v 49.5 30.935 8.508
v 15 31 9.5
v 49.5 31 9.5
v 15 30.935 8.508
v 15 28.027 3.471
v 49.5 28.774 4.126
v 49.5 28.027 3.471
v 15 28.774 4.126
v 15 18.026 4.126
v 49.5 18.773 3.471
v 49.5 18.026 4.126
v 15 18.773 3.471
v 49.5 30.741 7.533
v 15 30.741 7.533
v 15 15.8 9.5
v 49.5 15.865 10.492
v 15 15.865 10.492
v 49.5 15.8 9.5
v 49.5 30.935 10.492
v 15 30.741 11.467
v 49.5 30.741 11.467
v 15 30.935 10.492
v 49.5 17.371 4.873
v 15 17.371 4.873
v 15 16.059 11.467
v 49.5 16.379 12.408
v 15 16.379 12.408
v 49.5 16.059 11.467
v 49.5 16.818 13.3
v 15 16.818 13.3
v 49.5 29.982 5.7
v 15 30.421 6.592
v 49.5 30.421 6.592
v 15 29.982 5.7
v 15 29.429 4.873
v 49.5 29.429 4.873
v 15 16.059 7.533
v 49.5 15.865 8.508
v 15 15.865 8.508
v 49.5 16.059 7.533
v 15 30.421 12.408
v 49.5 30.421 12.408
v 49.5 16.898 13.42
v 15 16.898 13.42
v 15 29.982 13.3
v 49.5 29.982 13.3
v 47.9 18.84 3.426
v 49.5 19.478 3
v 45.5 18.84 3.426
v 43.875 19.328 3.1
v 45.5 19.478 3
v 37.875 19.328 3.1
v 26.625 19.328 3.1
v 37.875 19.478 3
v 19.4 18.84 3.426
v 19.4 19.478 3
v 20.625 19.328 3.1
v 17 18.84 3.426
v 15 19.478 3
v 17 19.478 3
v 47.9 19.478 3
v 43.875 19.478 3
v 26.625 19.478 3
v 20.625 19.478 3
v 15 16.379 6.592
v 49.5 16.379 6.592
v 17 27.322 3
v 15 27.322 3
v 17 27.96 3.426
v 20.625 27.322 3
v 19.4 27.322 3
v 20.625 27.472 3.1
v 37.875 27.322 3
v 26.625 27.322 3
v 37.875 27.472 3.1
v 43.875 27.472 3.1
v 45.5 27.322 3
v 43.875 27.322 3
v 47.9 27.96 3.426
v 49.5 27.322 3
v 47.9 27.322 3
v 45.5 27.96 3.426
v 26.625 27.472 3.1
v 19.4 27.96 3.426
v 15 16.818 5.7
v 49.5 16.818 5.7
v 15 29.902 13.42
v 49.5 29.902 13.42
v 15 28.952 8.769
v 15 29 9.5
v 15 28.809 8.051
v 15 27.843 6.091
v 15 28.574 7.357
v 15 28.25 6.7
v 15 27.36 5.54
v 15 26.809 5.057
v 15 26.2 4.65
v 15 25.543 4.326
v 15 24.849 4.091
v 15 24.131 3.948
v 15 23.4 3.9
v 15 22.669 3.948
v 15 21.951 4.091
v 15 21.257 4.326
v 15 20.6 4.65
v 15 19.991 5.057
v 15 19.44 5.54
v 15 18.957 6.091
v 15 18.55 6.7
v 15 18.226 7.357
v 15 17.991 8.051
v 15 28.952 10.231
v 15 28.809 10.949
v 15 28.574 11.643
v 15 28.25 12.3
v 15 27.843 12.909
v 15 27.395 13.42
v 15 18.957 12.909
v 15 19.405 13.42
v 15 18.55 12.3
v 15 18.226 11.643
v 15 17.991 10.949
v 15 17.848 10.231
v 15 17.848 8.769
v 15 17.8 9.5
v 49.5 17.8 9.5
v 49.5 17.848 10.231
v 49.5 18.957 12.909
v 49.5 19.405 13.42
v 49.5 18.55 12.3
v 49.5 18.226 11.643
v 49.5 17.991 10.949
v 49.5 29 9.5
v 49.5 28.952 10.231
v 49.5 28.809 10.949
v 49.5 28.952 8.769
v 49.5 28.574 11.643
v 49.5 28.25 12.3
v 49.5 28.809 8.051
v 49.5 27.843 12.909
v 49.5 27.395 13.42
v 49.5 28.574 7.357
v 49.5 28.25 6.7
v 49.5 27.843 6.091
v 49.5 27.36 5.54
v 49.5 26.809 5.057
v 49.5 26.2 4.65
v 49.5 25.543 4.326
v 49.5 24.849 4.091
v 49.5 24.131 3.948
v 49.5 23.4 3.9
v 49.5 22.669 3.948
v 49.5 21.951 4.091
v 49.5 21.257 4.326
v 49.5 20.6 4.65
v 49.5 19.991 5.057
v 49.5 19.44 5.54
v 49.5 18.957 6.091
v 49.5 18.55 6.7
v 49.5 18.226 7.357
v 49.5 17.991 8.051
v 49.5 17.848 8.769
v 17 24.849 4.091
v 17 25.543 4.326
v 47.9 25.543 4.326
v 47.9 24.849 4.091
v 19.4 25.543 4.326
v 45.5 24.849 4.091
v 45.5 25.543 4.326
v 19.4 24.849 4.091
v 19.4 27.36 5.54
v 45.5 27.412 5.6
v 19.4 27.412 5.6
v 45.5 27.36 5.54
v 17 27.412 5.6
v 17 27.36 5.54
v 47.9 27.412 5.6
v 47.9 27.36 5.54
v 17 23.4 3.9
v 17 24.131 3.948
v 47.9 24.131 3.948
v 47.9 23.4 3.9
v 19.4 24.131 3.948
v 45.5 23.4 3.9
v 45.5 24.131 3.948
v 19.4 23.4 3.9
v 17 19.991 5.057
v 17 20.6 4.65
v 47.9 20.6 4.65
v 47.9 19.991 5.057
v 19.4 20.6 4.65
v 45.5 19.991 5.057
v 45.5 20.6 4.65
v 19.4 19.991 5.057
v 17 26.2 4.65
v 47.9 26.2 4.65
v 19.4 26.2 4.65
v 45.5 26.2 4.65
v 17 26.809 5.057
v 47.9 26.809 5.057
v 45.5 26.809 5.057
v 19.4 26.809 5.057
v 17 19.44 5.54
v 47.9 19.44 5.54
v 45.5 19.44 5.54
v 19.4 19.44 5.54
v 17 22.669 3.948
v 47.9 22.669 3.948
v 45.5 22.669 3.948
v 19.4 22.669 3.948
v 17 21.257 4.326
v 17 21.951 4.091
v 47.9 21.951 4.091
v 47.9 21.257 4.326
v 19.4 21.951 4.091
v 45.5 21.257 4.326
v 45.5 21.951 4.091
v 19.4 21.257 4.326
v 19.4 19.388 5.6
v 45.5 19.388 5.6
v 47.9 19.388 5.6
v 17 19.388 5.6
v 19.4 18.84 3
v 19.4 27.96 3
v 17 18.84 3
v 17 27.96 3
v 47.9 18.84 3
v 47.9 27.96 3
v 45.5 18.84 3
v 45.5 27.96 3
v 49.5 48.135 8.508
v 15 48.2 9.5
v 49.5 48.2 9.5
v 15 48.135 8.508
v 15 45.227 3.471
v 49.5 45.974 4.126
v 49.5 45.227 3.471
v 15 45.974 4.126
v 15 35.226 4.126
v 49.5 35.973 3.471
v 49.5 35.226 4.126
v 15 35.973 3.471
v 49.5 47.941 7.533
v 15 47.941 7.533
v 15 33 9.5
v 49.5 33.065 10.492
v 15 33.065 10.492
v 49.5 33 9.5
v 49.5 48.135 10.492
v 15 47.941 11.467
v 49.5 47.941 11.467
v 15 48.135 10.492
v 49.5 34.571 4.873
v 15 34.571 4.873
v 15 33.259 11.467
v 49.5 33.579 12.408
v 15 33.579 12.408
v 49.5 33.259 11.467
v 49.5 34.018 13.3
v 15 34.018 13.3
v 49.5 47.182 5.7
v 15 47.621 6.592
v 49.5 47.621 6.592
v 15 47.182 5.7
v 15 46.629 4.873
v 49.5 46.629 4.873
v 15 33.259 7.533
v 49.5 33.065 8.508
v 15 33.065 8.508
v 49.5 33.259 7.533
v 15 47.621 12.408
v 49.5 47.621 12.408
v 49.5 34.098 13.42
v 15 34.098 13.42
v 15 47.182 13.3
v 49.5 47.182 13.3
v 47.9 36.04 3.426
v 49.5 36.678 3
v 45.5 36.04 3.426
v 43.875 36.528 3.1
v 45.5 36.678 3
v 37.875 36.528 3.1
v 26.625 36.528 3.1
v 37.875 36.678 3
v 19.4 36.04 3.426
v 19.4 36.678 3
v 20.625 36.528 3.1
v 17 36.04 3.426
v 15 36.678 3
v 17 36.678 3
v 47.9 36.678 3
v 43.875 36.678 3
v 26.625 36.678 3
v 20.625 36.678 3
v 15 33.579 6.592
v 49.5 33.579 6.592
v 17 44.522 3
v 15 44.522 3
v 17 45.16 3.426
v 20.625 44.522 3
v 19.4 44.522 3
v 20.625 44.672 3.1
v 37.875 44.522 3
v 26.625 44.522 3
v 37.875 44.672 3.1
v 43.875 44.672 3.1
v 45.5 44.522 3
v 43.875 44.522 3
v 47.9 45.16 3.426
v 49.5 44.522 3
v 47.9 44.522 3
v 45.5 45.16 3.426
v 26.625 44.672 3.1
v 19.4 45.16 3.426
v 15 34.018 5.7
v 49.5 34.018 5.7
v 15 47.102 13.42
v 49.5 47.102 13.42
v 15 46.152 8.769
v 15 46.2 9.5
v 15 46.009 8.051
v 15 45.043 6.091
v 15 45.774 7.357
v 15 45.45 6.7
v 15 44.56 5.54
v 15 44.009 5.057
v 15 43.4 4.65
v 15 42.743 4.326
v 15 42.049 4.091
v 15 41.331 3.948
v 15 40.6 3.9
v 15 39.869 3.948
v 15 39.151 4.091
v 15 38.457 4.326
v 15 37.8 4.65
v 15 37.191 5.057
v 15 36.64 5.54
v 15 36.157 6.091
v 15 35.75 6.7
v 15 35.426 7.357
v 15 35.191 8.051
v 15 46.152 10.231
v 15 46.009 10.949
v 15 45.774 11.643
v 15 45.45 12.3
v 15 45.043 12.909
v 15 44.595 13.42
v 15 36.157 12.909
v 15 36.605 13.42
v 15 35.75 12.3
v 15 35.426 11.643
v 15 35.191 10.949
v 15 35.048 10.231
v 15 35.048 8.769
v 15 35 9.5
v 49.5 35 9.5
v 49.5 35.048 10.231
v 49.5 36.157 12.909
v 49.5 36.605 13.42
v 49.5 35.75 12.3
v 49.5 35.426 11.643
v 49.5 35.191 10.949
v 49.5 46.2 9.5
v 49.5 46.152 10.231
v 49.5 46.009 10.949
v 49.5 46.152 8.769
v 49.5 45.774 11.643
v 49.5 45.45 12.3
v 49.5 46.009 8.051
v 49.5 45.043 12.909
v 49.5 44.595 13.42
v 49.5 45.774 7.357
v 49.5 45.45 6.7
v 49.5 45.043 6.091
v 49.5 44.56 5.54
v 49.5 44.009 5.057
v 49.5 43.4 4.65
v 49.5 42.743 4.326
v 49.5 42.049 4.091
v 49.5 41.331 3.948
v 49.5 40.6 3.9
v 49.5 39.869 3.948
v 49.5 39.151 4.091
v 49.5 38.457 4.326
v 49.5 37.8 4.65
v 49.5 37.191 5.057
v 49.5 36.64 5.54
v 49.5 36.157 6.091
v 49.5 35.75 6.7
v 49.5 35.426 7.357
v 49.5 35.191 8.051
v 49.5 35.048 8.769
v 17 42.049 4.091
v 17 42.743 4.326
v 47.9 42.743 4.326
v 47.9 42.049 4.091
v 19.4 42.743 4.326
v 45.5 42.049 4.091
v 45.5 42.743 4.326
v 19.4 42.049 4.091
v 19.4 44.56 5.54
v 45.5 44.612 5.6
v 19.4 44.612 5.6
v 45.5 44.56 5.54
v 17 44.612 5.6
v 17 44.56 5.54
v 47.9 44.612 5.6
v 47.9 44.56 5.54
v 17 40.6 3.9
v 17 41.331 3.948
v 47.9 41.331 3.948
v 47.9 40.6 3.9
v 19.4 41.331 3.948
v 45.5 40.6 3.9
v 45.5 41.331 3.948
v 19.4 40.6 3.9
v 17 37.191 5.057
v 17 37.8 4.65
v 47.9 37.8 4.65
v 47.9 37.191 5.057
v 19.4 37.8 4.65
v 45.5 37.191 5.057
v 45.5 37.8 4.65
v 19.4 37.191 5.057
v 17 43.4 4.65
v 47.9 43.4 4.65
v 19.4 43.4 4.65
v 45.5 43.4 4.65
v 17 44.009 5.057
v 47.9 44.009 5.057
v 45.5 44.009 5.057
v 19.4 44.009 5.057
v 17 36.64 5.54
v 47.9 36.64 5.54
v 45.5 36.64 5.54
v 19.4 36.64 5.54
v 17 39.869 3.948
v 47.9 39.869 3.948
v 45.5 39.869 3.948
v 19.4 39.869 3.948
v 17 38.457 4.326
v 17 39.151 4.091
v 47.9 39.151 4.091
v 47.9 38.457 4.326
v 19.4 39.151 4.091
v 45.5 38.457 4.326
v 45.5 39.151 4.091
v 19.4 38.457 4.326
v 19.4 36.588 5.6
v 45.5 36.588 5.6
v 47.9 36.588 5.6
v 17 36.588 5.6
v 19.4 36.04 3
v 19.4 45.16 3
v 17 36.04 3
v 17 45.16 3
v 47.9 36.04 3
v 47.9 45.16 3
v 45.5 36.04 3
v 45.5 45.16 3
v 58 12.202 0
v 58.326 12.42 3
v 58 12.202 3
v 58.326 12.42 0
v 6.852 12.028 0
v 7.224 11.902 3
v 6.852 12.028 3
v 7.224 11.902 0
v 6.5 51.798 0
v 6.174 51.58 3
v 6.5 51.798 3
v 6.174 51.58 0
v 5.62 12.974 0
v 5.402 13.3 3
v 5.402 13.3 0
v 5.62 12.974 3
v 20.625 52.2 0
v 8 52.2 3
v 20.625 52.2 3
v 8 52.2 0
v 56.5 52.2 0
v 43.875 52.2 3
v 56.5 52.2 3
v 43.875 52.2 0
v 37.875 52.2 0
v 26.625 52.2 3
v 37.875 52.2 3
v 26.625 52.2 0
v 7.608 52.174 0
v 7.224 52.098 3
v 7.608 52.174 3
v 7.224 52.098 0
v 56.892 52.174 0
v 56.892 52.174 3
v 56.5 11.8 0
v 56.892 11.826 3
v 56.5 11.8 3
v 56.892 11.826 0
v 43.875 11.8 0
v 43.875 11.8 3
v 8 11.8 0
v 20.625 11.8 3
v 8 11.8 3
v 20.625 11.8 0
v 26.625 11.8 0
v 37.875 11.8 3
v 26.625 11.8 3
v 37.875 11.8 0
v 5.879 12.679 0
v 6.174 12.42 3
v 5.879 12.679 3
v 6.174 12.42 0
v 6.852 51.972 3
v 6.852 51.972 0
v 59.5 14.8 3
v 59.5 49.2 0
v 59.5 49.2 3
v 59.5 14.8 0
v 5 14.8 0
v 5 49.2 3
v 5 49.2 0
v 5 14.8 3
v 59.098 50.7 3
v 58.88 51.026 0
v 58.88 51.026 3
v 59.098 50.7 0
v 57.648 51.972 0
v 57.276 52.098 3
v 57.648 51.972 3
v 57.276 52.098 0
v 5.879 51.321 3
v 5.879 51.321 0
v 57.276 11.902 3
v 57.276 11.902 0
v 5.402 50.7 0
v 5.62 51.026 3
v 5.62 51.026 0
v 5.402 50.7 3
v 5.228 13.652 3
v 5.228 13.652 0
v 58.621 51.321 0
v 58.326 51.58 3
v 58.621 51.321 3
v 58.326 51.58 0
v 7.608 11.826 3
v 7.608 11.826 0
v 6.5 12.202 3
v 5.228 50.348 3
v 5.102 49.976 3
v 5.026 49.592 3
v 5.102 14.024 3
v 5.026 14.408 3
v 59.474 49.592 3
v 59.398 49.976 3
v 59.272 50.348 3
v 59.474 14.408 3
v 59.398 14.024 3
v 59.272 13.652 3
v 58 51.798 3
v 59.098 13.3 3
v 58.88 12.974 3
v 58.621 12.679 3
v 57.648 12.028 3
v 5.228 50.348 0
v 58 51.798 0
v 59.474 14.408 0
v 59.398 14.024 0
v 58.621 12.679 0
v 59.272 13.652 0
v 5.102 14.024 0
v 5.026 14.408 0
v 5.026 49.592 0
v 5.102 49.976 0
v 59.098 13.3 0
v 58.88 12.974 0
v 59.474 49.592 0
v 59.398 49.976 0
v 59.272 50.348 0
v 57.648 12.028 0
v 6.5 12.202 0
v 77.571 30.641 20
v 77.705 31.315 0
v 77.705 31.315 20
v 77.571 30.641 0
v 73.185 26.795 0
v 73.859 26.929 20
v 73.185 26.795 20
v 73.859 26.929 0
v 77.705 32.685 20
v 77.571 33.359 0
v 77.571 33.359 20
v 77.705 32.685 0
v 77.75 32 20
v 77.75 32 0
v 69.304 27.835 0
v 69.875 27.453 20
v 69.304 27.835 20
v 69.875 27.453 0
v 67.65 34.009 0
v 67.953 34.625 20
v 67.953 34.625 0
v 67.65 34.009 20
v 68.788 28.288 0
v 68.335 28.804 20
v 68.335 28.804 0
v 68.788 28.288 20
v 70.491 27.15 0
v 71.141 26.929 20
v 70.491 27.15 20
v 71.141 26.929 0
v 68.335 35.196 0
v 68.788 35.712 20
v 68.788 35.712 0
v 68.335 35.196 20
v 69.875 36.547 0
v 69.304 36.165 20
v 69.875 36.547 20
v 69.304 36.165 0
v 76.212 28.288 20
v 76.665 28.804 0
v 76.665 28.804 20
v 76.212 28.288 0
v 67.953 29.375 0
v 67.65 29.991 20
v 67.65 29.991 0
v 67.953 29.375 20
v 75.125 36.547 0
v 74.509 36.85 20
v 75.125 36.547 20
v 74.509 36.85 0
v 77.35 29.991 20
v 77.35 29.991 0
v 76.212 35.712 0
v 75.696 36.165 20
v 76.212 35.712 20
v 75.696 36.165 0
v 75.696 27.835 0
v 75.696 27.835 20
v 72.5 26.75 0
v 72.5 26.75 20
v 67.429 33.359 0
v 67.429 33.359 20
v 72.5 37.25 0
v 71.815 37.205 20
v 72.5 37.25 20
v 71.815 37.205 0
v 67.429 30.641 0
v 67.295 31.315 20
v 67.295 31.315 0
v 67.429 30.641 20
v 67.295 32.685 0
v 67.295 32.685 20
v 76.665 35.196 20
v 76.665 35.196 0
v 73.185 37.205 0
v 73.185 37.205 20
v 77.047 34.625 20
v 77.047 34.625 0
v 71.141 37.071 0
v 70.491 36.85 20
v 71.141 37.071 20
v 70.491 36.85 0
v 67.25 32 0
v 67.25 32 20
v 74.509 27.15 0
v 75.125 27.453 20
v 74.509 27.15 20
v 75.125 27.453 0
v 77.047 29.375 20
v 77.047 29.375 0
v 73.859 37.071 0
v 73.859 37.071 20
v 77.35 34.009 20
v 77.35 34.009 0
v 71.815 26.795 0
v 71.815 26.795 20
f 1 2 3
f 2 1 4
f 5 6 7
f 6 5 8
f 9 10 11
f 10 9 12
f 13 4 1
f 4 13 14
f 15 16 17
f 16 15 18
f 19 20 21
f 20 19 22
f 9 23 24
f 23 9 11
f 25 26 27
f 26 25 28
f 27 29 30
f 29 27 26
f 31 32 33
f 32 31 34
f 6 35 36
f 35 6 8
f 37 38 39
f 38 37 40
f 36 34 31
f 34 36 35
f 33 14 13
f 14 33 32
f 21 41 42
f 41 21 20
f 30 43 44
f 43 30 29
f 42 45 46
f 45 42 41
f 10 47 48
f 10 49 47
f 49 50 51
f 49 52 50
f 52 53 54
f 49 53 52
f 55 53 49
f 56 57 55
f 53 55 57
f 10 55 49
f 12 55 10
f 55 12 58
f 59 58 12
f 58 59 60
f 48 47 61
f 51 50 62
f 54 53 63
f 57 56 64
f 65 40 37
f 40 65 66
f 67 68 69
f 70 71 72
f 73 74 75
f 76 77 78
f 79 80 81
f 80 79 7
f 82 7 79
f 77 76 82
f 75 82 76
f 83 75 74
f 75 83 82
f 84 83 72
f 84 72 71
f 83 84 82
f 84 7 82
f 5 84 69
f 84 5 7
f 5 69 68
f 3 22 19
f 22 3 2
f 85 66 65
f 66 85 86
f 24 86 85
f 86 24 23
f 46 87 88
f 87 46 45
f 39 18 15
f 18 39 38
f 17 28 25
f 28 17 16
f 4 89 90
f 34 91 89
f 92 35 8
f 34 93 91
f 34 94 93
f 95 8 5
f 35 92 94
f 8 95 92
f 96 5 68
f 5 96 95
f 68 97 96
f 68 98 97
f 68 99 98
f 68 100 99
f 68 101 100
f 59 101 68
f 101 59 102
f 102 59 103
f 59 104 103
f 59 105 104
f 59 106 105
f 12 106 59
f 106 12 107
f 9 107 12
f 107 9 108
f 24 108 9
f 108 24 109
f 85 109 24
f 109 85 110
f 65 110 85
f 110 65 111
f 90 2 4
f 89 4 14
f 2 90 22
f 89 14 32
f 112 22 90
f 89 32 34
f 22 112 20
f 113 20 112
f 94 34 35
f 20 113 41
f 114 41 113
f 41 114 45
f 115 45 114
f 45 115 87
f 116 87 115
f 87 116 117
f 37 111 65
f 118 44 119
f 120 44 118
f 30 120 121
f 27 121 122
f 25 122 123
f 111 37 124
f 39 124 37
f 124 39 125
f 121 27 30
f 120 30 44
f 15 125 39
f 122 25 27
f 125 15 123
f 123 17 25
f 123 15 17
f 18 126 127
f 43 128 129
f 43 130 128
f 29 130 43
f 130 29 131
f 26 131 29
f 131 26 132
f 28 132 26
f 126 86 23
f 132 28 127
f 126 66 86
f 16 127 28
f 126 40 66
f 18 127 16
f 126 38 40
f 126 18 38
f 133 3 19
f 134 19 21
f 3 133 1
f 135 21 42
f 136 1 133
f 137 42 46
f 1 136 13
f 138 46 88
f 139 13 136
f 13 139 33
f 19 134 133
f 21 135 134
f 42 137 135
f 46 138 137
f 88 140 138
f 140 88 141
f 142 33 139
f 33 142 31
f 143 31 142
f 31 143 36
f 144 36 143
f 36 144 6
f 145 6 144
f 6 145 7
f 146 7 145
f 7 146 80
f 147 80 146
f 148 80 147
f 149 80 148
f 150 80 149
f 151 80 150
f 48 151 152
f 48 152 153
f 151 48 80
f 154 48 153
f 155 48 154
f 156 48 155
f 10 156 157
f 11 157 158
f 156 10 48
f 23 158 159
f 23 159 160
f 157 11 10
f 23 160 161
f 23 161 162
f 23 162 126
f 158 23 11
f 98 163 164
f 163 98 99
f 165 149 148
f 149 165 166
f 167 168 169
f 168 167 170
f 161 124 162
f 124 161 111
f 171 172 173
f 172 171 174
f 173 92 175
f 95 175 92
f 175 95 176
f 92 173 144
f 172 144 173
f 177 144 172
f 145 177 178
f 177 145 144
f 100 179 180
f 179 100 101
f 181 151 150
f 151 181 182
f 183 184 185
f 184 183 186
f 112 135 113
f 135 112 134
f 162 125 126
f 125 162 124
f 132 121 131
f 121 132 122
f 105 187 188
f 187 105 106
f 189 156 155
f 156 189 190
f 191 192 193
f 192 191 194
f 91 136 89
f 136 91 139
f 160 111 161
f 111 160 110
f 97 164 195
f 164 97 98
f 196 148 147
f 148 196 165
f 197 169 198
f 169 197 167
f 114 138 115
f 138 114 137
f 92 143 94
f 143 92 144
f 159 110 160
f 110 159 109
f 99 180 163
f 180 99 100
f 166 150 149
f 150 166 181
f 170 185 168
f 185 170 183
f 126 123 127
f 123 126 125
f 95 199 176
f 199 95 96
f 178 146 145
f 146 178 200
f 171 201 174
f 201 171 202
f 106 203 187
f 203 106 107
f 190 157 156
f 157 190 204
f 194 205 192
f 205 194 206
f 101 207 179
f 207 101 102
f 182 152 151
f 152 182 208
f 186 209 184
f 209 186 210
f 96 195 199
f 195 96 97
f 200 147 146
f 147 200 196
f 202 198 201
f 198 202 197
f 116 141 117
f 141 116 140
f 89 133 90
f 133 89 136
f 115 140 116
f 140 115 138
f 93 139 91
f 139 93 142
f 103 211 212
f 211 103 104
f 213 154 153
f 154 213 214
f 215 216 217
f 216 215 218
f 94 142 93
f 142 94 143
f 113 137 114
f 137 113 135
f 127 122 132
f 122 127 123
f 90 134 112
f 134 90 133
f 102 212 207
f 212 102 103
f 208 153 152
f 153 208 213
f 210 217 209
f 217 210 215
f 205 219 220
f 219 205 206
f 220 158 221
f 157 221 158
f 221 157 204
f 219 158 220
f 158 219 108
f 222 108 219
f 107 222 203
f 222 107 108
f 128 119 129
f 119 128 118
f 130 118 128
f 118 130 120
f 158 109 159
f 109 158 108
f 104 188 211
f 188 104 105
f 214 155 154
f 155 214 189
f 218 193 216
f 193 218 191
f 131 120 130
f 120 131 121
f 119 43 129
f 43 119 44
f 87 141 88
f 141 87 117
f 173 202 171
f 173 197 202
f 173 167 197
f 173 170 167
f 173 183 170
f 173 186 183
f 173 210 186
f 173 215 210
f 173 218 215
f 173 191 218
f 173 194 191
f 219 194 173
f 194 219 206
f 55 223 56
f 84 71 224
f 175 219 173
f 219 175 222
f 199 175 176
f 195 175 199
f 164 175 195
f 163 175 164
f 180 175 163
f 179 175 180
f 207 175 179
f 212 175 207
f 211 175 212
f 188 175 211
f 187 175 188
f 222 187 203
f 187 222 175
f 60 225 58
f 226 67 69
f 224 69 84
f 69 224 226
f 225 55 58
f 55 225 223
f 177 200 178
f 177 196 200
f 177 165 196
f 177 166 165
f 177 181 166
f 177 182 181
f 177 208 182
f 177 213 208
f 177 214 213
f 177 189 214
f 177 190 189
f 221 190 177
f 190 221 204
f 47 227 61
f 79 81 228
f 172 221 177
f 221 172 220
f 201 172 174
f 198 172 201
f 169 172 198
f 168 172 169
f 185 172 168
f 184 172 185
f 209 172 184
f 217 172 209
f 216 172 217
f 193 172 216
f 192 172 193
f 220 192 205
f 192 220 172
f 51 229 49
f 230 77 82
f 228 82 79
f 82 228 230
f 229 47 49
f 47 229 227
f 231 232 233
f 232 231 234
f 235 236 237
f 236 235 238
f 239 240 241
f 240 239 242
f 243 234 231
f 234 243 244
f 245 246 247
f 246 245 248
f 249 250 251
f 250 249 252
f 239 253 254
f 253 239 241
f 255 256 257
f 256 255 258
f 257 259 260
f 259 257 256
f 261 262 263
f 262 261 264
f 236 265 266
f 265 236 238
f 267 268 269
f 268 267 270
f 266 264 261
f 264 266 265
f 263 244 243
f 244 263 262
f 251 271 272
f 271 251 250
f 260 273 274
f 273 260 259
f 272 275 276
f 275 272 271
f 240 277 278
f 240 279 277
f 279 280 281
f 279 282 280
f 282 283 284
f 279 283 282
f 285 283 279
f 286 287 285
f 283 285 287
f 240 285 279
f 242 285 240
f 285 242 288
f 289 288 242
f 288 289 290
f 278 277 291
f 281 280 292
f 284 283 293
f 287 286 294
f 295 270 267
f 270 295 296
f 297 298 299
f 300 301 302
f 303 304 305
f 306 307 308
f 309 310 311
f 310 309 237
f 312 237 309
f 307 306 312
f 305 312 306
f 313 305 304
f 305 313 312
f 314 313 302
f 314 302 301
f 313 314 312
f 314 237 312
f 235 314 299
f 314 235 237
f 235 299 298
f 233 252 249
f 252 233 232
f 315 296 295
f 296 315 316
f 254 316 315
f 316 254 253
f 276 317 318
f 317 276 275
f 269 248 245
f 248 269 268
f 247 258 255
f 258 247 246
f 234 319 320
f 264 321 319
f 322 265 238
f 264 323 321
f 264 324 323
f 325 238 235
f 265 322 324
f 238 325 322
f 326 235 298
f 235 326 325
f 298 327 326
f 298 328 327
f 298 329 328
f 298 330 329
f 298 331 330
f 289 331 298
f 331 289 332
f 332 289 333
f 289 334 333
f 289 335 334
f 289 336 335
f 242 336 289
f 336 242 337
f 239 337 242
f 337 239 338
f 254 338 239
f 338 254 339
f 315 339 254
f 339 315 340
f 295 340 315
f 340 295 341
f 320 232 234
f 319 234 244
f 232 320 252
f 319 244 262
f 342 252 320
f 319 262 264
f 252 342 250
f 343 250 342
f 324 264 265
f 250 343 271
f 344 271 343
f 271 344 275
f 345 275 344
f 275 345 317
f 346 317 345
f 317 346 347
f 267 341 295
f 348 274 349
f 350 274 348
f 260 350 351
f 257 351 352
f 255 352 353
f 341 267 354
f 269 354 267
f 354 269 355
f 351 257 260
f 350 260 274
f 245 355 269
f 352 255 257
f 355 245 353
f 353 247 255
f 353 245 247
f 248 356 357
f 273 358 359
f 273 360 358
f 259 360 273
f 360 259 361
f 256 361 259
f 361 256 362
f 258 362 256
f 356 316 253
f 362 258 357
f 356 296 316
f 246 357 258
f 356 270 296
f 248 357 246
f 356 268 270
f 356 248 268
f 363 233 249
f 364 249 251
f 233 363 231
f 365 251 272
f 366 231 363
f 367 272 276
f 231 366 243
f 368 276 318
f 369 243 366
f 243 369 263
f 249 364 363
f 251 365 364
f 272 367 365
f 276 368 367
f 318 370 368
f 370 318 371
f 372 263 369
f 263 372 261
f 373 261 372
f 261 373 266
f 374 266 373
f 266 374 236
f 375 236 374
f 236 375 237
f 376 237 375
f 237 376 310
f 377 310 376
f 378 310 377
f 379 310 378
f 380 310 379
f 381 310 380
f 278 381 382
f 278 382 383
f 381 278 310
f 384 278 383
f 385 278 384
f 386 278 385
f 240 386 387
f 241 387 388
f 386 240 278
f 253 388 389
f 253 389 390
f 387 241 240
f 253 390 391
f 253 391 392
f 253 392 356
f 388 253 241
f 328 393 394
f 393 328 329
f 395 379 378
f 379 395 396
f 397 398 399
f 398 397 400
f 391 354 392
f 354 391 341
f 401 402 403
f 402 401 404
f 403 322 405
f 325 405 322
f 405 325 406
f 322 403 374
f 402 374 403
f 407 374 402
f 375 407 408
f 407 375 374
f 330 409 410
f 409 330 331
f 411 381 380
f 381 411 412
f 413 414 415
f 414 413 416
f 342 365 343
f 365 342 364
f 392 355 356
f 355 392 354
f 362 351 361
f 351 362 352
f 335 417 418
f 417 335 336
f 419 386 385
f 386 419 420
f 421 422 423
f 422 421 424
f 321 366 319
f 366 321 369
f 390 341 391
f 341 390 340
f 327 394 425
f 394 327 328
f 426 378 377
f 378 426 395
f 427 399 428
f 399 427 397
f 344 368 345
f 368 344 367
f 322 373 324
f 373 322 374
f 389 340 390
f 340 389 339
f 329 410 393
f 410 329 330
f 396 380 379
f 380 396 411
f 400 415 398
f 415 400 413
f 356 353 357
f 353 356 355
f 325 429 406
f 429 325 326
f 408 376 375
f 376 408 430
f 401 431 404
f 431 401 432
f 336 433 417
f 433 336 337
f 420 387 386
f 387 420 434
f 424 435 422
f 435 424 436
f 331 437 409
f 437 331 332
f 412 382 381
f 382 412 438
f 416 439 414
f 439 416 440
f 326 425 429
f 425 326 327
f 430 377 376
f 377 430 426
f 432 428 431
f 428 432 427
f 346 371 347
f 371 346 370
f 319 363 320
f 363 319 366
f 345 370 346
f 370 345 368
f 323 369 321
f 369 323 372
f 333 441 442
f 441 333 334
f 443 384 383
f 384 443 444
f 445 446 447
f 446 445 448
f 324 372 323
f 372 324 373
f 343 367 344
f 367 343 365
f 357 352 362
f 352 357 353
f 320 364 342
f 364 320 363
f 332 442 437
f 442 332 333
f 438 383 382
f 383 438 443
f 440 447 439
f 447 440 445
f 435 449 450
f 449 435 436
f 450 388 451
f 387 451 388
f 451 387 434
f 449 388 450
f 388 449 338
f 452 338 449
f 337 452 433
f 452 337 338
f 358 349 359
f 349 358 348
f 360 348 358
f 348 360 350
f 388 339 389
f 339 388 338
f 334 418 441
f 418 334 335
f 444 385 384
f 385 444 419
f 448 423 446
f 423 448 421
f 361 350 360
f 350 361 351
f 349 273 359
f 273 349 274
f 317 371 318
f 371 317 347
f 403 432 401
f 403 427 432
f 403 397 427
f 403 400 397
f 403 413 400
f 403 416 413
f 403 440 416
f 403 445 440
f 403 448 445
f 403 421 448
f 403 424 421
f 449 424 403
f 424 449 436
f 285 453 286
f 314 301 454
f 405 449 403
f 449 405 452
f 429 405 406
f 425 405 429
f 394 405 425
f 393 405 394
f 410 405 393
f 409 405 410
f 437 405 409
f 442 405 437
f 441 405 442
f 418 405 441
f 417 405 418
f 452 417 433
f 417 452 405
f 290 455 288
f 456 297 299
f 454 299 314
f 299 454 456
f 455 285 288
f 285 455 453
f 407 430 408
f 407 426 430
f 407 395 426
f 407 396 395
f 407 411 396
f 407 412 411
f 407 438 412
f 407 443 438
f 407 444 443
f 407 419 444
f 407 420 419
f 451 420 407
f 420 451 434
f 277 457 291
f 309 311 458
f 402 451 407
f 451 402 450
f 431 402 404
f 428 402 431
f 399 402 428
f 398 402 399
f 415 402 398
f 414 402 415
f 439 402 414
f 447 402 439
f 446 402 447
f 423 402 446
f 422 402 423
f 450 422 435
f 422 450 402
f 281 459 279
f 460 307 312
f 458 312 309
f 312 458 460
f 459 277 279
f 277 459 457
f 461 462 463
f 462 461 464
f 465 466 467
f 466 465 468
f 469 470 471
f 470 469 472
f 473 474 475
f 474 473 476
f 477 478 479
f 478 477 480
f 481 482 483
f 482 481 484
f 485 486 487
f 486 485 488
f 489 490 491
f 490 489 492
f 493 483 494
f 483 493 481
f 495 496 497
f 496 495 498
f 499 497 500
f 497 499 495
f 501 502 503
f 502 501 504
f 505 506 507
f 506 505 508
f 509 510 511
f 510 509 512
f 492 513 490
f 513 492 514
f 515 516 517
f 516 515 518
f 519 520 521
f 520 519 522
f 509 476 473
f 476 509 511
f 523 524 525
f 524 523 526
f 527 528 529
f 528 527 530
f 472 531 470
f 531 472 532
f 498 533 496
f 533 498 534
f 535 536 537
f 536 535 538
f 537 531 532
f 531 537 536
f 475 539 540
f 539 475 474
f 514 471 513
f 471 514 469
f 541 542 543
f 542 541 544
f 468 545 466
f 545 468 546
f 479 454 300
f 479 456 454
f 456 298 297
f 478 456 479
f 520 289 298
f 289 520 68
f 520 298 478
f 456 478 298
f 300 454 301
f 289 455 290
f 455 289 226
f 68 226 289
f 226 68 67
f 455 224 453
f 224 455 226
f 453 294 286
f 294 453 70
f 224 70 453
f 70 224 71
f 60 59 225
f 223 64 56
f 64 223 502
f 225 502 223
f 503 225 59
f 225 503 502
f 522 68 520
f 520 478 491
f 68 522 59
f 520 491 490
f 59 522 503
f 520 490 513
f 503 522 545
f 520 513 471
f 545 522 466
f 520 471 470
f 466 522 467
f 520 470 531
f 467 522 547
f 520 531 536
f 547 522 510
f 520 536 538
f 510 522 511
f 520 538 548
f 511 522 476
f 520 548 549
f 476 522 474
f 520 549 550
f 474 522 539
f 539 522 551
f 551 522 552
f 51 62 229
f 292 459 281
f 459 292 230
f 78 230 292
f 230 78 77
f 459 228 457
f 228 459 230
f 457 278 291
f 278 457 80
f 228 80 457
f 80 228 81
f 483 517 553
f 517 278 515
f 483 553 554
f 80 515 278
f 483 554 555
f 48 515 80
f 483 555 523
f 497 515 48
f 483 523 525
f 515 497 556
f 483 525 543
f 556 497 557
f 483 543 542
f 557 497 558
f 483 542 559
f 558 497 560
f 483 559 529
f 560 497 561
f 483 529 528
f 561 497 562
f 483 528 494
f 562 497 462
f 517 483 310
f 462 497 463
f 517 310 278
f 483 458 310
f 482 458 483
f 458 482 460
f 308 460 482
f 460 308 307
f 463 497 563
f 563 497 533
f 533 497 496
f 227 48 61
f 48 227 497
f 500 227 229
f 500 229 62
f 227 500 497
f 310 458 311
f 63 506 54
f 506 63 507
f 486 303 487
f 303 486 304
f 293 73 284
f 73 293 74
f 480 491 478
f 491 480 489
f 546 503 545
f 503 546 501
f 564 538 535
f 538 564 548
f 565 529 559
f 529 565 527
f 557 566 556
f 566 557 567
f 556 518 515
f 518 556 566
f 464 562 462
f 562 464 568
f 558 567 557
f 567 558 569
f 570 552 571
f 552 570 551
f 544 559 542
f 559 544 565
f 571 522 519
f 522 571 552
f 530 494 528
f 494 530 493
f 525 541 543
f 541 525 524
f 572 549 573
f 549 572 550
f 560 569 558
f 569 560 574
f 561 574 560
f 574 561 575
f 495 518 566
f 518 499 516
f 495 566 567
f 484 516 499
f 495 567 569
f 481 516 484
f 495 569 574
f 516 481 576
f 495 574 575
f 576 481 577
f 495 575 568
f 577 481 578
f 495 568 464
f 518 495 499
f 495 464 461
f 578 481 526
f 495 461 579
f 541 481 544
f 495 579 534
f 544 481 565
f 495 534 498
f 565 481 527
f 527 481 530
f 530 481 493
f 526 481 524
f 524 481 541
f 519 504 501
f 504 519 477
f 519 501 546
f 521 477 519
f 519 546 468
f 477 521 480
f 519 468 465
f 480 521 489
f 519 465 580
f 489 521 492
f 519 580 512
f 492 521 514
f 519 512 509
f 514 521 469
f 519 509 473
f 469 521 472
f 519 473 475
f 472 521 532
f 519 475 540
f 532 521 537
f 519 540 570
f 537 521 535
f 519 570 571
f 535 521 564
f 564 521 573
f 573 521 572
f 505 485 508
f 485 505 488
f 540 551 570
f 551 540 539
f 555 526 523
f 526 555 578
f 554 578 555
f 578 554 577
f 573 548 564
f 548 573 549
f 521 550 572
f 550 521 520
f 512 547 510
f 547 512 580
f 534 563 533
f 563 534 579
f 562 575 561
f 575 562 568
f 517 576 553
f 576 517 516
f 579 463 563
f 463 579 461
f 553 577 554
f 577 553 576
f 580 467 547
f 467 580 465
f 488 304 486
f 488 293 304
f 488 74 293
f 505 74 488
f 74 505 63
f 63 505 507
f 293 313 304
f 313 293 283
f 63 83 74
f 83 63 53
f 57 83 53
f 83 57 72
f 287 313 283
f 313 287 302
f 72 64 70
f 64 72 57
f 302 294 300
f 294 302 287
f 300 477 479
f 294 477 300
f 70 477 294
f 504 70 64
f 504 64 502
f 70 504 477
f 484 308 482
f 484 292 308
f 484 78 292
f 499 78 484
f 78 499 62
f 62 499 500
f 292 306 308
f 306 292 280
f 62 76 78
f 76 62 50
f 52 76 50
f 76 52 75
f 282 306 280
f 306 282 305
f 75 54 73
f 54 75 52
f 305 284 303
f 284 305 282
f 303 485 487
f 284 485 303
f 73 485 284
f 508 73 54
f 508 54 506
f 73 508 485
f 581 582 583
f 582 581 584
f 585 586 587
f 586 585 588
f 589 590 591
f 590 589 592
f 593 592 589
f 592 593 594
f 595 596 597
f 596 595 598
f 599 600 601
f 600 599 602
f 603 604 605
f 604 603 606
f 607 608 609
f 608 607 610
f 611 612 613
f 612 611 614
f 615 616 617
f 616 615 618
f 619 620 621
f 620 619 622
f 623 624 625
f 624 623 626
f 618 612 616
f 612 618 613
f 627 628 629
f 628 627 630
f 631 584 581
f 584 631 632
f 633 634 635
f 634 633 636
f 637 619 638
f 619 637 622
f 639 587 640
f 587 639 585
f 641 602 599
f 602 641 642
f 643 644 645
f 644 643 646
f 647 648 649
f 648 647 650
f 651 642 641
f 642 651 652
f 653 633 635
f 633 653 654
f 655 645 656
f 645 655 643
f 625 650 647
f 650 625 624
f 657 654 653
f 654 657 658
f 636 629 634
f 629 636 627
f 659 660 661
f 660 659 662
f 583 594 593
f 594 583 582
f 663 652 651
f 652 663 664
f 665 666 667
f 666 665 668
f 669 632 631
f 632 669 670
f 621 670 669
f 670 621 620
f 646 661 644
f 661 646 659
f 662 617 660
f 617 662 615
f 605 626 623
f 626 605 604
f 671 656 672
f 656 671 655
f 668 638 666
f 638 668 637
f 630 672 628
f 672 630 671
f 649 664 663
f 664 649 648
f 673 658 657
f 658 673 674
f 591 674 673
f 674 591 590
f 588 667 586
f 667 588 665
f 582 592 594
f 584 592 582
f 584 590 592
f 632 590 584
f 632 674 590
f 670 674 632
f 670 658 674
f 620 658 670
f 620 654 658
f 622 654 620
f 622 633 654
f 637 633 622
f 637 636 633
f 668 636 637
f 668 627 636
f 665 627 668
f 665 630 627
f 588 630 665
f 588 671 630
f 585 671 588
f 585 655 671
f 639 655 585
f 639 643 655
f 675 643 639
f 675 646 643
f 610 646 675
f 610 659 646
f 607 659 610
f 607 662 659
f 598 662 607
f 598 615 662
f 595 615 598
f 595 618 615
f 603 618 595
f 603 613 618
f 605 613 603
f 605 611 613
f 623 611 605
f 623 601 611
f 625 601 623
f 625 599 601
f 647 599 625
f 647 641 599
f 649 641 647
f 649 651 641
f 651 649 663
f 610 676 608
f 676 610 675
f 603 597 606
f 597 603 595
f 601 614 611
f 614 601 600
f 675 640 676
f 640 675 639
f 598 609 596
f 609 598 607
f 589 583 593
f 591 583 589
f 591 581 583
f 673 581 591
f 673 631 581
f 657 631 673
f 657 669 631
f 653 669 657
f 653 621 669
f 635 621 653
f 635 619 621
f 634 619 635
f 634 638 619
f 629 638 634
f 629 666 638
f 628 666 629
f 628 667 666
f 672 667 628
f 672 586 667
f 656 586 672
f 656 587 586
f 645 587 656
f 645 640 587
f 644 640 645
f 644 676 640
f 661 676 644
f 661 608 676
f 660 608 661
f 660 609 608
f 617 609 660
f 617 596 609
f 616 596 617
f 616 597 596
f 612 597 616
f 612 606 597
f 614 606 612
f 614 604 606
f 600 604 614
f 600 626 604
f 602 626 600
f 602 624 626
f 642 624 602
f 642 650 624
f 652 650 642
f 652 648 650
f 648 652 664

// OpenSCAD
/*
Sample 150: Zylindrischer Zellhalter — 2 x AAA
Generated from the FDM Mechanical Sample Library.
Units: millimetres.

Override examples:
  openscad -o custom.stl -D 'view="plate"' -D 'render_fn=64' model.scad
  openscad -o preview.png -D 'view="assembly"' model.scad
*/
use <../../../library/fdm_mechanisms.scad>

render_fn = is_undef(render_fn) ? 48 : render_fn;
view = is_undef(view) ? "plate" : view;
$fn = render_fn;

sample_cell_cradle(
    view=view,
    cell_d=10.5,
    cell_l=44.5,
    count=2,
    cell_gap=2,
    clearance=0.35,
    strap_w=6,
    contact_keepout=5
);
